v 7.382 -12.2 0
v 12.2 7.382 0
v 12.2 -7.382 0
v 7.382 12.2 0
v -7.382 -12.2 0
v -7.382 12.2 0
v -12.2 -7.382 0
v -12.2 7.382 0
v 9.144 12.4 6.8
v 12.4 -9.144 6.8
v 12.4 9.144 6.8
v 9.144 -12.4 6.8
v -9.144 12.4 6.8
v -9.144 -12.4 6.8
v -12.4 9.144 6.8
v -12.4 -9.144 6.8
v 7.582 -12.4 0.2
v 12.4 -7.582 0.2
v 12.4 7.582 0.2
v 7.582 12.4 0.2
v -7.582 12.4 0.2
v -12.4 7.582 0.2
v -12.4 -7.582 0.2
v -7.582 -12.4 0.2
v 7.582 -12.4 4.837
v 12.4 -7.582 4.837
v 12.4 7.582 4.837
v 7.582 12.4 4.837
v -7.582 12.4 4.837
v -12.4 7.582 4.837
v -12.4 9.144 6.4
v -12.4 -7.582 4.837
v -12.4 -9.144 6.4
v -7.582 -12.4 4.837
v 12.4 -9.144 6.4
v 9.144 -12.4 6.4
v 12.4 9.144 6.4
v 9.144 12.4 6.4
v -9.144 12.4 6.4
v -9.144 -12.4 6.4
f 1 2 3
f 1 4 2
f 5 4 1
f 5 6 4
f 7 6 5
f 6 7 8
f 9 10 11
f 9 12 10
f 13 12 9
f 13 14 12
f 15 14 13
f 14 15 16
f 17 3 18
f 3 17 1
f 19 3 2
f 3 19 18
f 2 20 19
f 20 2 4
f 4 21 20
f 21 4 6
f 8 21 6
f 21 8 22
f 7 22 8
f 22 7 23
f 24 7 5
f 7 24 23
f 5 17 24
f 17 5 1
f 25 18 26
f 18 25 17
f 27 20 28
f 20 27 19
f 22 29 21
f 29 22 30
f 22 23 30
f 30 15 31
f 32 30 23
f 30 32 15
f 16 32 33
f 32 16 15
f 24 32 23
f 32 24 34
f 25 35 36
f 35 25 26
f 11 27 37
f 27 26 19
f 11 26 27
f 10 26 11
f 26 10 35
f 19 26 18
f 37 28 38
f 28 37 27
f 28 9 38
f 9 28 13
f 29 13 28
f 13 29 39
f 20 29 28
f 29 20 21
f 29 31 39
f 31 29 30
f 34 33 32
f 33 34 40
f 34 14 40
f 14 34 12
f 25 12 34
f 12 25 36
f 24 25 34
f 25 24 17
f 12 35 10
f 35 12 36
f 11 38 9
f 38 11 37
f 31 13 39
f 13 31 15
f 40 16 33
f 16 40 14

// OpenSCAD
// Reduced OpenGrid snap: outer shell minus one horizontal and one vertical
// clip cutout. Their 45-degree ends overlap at a knife edge.
$fn = 16;

function rev(v) = [for (i = [0 : len(v) - 1]) v[len(v) - 1 - i]];

function crect(base, chamfer) = [
    [ base[0]/2 - chamfer, -base[1]/2],
    [ base[0]/2, -base[1]/2 + chamfer],
    [ base[0]/2,  base[1]/2 - chamfer],
    [ base[0]/2 - chamfer,  base[1]/2],
    [-base[0]/2 + chamfer,  base[1]/2],
    [-base[0]/2,  base[1]/2 - chamfer],
    [-base[0]/2, -base[1]/2 + chamfer],
    [-base[0]/2 + chamfer, -base[1]/2]
];

module sweep(slices) {
    n = len(slices);
    pp = 8;
    points = [
        for (s = slices)
            for (p = crect([s[1], s[2]], s[3]))
                [p[0], p[1], s[0]]
    ];
    bottom = rev([for (i = [0 : pp - 1]) i]);
    top_start = (n - 1) * pp;
    top = [for (i = [0 : pp - 1]) top_start + i];
    sides = concat(
        [for (i = [0 : n - 2]) for (j = [0 : pp - 1])
            [i*pp + j, i*pp + (j + 1) % pp, (i + 1)*pp + (j + 1) % pp]],
        [for (i = [0 : n - 2]) for (j = [0 : pp - 1])
            [i*pp + j, (i + 1)*pp + (j + 1) % pp, (i + 1)*pp + j]]
    );
    faces = [for (f = concat([bottom], [top], sides)) rev(f)];
    polyhedron(points = points, faces = faces, convexity = 10);
}

module snap_shell() {
    // snap_outer_shell: 24.8 base, 6.8 high, 0.2 base chamfer, with the
    // corner chamfer stepping from 4.81838 to 3.25588 near the top.
    sweep([
        [0, 24.4, 24.4, 4.81838],
        [0.2, 24.8, 24.8, 4.81838],
        [4.8375, 24.8, 24.8, 4.81838],
        [6.4, 24.8, 24.8, 3.25588],
        [6.8, 24.8, 24.8, 3.25588]
    ]);
}

module horizontal_cutout() {
    translate([0, -12.5, 5.8])
    rotate([-90, 0, 0])
    sweep([
        [0, 12, 0.4, 0.4 / 3],
        [1.3, 12, 0.4, 0.4 / 3],
        [1.5, 11.6, 0.000001, 0.4 / 3]
    ]);
}

module vertical_cutout() {
    translate([0, -11.1, -0.2])
    sweep([
        [0, 12, 0.6, 0.2],
        [5.8, 12, 0.6, 0.2],
        [6.1, 11.4, 0.000001, 0.2]
    ]);
}

render()
difference() {
    snap_shell();
    horizontal_cutout();
    vertical_cutout();
}
